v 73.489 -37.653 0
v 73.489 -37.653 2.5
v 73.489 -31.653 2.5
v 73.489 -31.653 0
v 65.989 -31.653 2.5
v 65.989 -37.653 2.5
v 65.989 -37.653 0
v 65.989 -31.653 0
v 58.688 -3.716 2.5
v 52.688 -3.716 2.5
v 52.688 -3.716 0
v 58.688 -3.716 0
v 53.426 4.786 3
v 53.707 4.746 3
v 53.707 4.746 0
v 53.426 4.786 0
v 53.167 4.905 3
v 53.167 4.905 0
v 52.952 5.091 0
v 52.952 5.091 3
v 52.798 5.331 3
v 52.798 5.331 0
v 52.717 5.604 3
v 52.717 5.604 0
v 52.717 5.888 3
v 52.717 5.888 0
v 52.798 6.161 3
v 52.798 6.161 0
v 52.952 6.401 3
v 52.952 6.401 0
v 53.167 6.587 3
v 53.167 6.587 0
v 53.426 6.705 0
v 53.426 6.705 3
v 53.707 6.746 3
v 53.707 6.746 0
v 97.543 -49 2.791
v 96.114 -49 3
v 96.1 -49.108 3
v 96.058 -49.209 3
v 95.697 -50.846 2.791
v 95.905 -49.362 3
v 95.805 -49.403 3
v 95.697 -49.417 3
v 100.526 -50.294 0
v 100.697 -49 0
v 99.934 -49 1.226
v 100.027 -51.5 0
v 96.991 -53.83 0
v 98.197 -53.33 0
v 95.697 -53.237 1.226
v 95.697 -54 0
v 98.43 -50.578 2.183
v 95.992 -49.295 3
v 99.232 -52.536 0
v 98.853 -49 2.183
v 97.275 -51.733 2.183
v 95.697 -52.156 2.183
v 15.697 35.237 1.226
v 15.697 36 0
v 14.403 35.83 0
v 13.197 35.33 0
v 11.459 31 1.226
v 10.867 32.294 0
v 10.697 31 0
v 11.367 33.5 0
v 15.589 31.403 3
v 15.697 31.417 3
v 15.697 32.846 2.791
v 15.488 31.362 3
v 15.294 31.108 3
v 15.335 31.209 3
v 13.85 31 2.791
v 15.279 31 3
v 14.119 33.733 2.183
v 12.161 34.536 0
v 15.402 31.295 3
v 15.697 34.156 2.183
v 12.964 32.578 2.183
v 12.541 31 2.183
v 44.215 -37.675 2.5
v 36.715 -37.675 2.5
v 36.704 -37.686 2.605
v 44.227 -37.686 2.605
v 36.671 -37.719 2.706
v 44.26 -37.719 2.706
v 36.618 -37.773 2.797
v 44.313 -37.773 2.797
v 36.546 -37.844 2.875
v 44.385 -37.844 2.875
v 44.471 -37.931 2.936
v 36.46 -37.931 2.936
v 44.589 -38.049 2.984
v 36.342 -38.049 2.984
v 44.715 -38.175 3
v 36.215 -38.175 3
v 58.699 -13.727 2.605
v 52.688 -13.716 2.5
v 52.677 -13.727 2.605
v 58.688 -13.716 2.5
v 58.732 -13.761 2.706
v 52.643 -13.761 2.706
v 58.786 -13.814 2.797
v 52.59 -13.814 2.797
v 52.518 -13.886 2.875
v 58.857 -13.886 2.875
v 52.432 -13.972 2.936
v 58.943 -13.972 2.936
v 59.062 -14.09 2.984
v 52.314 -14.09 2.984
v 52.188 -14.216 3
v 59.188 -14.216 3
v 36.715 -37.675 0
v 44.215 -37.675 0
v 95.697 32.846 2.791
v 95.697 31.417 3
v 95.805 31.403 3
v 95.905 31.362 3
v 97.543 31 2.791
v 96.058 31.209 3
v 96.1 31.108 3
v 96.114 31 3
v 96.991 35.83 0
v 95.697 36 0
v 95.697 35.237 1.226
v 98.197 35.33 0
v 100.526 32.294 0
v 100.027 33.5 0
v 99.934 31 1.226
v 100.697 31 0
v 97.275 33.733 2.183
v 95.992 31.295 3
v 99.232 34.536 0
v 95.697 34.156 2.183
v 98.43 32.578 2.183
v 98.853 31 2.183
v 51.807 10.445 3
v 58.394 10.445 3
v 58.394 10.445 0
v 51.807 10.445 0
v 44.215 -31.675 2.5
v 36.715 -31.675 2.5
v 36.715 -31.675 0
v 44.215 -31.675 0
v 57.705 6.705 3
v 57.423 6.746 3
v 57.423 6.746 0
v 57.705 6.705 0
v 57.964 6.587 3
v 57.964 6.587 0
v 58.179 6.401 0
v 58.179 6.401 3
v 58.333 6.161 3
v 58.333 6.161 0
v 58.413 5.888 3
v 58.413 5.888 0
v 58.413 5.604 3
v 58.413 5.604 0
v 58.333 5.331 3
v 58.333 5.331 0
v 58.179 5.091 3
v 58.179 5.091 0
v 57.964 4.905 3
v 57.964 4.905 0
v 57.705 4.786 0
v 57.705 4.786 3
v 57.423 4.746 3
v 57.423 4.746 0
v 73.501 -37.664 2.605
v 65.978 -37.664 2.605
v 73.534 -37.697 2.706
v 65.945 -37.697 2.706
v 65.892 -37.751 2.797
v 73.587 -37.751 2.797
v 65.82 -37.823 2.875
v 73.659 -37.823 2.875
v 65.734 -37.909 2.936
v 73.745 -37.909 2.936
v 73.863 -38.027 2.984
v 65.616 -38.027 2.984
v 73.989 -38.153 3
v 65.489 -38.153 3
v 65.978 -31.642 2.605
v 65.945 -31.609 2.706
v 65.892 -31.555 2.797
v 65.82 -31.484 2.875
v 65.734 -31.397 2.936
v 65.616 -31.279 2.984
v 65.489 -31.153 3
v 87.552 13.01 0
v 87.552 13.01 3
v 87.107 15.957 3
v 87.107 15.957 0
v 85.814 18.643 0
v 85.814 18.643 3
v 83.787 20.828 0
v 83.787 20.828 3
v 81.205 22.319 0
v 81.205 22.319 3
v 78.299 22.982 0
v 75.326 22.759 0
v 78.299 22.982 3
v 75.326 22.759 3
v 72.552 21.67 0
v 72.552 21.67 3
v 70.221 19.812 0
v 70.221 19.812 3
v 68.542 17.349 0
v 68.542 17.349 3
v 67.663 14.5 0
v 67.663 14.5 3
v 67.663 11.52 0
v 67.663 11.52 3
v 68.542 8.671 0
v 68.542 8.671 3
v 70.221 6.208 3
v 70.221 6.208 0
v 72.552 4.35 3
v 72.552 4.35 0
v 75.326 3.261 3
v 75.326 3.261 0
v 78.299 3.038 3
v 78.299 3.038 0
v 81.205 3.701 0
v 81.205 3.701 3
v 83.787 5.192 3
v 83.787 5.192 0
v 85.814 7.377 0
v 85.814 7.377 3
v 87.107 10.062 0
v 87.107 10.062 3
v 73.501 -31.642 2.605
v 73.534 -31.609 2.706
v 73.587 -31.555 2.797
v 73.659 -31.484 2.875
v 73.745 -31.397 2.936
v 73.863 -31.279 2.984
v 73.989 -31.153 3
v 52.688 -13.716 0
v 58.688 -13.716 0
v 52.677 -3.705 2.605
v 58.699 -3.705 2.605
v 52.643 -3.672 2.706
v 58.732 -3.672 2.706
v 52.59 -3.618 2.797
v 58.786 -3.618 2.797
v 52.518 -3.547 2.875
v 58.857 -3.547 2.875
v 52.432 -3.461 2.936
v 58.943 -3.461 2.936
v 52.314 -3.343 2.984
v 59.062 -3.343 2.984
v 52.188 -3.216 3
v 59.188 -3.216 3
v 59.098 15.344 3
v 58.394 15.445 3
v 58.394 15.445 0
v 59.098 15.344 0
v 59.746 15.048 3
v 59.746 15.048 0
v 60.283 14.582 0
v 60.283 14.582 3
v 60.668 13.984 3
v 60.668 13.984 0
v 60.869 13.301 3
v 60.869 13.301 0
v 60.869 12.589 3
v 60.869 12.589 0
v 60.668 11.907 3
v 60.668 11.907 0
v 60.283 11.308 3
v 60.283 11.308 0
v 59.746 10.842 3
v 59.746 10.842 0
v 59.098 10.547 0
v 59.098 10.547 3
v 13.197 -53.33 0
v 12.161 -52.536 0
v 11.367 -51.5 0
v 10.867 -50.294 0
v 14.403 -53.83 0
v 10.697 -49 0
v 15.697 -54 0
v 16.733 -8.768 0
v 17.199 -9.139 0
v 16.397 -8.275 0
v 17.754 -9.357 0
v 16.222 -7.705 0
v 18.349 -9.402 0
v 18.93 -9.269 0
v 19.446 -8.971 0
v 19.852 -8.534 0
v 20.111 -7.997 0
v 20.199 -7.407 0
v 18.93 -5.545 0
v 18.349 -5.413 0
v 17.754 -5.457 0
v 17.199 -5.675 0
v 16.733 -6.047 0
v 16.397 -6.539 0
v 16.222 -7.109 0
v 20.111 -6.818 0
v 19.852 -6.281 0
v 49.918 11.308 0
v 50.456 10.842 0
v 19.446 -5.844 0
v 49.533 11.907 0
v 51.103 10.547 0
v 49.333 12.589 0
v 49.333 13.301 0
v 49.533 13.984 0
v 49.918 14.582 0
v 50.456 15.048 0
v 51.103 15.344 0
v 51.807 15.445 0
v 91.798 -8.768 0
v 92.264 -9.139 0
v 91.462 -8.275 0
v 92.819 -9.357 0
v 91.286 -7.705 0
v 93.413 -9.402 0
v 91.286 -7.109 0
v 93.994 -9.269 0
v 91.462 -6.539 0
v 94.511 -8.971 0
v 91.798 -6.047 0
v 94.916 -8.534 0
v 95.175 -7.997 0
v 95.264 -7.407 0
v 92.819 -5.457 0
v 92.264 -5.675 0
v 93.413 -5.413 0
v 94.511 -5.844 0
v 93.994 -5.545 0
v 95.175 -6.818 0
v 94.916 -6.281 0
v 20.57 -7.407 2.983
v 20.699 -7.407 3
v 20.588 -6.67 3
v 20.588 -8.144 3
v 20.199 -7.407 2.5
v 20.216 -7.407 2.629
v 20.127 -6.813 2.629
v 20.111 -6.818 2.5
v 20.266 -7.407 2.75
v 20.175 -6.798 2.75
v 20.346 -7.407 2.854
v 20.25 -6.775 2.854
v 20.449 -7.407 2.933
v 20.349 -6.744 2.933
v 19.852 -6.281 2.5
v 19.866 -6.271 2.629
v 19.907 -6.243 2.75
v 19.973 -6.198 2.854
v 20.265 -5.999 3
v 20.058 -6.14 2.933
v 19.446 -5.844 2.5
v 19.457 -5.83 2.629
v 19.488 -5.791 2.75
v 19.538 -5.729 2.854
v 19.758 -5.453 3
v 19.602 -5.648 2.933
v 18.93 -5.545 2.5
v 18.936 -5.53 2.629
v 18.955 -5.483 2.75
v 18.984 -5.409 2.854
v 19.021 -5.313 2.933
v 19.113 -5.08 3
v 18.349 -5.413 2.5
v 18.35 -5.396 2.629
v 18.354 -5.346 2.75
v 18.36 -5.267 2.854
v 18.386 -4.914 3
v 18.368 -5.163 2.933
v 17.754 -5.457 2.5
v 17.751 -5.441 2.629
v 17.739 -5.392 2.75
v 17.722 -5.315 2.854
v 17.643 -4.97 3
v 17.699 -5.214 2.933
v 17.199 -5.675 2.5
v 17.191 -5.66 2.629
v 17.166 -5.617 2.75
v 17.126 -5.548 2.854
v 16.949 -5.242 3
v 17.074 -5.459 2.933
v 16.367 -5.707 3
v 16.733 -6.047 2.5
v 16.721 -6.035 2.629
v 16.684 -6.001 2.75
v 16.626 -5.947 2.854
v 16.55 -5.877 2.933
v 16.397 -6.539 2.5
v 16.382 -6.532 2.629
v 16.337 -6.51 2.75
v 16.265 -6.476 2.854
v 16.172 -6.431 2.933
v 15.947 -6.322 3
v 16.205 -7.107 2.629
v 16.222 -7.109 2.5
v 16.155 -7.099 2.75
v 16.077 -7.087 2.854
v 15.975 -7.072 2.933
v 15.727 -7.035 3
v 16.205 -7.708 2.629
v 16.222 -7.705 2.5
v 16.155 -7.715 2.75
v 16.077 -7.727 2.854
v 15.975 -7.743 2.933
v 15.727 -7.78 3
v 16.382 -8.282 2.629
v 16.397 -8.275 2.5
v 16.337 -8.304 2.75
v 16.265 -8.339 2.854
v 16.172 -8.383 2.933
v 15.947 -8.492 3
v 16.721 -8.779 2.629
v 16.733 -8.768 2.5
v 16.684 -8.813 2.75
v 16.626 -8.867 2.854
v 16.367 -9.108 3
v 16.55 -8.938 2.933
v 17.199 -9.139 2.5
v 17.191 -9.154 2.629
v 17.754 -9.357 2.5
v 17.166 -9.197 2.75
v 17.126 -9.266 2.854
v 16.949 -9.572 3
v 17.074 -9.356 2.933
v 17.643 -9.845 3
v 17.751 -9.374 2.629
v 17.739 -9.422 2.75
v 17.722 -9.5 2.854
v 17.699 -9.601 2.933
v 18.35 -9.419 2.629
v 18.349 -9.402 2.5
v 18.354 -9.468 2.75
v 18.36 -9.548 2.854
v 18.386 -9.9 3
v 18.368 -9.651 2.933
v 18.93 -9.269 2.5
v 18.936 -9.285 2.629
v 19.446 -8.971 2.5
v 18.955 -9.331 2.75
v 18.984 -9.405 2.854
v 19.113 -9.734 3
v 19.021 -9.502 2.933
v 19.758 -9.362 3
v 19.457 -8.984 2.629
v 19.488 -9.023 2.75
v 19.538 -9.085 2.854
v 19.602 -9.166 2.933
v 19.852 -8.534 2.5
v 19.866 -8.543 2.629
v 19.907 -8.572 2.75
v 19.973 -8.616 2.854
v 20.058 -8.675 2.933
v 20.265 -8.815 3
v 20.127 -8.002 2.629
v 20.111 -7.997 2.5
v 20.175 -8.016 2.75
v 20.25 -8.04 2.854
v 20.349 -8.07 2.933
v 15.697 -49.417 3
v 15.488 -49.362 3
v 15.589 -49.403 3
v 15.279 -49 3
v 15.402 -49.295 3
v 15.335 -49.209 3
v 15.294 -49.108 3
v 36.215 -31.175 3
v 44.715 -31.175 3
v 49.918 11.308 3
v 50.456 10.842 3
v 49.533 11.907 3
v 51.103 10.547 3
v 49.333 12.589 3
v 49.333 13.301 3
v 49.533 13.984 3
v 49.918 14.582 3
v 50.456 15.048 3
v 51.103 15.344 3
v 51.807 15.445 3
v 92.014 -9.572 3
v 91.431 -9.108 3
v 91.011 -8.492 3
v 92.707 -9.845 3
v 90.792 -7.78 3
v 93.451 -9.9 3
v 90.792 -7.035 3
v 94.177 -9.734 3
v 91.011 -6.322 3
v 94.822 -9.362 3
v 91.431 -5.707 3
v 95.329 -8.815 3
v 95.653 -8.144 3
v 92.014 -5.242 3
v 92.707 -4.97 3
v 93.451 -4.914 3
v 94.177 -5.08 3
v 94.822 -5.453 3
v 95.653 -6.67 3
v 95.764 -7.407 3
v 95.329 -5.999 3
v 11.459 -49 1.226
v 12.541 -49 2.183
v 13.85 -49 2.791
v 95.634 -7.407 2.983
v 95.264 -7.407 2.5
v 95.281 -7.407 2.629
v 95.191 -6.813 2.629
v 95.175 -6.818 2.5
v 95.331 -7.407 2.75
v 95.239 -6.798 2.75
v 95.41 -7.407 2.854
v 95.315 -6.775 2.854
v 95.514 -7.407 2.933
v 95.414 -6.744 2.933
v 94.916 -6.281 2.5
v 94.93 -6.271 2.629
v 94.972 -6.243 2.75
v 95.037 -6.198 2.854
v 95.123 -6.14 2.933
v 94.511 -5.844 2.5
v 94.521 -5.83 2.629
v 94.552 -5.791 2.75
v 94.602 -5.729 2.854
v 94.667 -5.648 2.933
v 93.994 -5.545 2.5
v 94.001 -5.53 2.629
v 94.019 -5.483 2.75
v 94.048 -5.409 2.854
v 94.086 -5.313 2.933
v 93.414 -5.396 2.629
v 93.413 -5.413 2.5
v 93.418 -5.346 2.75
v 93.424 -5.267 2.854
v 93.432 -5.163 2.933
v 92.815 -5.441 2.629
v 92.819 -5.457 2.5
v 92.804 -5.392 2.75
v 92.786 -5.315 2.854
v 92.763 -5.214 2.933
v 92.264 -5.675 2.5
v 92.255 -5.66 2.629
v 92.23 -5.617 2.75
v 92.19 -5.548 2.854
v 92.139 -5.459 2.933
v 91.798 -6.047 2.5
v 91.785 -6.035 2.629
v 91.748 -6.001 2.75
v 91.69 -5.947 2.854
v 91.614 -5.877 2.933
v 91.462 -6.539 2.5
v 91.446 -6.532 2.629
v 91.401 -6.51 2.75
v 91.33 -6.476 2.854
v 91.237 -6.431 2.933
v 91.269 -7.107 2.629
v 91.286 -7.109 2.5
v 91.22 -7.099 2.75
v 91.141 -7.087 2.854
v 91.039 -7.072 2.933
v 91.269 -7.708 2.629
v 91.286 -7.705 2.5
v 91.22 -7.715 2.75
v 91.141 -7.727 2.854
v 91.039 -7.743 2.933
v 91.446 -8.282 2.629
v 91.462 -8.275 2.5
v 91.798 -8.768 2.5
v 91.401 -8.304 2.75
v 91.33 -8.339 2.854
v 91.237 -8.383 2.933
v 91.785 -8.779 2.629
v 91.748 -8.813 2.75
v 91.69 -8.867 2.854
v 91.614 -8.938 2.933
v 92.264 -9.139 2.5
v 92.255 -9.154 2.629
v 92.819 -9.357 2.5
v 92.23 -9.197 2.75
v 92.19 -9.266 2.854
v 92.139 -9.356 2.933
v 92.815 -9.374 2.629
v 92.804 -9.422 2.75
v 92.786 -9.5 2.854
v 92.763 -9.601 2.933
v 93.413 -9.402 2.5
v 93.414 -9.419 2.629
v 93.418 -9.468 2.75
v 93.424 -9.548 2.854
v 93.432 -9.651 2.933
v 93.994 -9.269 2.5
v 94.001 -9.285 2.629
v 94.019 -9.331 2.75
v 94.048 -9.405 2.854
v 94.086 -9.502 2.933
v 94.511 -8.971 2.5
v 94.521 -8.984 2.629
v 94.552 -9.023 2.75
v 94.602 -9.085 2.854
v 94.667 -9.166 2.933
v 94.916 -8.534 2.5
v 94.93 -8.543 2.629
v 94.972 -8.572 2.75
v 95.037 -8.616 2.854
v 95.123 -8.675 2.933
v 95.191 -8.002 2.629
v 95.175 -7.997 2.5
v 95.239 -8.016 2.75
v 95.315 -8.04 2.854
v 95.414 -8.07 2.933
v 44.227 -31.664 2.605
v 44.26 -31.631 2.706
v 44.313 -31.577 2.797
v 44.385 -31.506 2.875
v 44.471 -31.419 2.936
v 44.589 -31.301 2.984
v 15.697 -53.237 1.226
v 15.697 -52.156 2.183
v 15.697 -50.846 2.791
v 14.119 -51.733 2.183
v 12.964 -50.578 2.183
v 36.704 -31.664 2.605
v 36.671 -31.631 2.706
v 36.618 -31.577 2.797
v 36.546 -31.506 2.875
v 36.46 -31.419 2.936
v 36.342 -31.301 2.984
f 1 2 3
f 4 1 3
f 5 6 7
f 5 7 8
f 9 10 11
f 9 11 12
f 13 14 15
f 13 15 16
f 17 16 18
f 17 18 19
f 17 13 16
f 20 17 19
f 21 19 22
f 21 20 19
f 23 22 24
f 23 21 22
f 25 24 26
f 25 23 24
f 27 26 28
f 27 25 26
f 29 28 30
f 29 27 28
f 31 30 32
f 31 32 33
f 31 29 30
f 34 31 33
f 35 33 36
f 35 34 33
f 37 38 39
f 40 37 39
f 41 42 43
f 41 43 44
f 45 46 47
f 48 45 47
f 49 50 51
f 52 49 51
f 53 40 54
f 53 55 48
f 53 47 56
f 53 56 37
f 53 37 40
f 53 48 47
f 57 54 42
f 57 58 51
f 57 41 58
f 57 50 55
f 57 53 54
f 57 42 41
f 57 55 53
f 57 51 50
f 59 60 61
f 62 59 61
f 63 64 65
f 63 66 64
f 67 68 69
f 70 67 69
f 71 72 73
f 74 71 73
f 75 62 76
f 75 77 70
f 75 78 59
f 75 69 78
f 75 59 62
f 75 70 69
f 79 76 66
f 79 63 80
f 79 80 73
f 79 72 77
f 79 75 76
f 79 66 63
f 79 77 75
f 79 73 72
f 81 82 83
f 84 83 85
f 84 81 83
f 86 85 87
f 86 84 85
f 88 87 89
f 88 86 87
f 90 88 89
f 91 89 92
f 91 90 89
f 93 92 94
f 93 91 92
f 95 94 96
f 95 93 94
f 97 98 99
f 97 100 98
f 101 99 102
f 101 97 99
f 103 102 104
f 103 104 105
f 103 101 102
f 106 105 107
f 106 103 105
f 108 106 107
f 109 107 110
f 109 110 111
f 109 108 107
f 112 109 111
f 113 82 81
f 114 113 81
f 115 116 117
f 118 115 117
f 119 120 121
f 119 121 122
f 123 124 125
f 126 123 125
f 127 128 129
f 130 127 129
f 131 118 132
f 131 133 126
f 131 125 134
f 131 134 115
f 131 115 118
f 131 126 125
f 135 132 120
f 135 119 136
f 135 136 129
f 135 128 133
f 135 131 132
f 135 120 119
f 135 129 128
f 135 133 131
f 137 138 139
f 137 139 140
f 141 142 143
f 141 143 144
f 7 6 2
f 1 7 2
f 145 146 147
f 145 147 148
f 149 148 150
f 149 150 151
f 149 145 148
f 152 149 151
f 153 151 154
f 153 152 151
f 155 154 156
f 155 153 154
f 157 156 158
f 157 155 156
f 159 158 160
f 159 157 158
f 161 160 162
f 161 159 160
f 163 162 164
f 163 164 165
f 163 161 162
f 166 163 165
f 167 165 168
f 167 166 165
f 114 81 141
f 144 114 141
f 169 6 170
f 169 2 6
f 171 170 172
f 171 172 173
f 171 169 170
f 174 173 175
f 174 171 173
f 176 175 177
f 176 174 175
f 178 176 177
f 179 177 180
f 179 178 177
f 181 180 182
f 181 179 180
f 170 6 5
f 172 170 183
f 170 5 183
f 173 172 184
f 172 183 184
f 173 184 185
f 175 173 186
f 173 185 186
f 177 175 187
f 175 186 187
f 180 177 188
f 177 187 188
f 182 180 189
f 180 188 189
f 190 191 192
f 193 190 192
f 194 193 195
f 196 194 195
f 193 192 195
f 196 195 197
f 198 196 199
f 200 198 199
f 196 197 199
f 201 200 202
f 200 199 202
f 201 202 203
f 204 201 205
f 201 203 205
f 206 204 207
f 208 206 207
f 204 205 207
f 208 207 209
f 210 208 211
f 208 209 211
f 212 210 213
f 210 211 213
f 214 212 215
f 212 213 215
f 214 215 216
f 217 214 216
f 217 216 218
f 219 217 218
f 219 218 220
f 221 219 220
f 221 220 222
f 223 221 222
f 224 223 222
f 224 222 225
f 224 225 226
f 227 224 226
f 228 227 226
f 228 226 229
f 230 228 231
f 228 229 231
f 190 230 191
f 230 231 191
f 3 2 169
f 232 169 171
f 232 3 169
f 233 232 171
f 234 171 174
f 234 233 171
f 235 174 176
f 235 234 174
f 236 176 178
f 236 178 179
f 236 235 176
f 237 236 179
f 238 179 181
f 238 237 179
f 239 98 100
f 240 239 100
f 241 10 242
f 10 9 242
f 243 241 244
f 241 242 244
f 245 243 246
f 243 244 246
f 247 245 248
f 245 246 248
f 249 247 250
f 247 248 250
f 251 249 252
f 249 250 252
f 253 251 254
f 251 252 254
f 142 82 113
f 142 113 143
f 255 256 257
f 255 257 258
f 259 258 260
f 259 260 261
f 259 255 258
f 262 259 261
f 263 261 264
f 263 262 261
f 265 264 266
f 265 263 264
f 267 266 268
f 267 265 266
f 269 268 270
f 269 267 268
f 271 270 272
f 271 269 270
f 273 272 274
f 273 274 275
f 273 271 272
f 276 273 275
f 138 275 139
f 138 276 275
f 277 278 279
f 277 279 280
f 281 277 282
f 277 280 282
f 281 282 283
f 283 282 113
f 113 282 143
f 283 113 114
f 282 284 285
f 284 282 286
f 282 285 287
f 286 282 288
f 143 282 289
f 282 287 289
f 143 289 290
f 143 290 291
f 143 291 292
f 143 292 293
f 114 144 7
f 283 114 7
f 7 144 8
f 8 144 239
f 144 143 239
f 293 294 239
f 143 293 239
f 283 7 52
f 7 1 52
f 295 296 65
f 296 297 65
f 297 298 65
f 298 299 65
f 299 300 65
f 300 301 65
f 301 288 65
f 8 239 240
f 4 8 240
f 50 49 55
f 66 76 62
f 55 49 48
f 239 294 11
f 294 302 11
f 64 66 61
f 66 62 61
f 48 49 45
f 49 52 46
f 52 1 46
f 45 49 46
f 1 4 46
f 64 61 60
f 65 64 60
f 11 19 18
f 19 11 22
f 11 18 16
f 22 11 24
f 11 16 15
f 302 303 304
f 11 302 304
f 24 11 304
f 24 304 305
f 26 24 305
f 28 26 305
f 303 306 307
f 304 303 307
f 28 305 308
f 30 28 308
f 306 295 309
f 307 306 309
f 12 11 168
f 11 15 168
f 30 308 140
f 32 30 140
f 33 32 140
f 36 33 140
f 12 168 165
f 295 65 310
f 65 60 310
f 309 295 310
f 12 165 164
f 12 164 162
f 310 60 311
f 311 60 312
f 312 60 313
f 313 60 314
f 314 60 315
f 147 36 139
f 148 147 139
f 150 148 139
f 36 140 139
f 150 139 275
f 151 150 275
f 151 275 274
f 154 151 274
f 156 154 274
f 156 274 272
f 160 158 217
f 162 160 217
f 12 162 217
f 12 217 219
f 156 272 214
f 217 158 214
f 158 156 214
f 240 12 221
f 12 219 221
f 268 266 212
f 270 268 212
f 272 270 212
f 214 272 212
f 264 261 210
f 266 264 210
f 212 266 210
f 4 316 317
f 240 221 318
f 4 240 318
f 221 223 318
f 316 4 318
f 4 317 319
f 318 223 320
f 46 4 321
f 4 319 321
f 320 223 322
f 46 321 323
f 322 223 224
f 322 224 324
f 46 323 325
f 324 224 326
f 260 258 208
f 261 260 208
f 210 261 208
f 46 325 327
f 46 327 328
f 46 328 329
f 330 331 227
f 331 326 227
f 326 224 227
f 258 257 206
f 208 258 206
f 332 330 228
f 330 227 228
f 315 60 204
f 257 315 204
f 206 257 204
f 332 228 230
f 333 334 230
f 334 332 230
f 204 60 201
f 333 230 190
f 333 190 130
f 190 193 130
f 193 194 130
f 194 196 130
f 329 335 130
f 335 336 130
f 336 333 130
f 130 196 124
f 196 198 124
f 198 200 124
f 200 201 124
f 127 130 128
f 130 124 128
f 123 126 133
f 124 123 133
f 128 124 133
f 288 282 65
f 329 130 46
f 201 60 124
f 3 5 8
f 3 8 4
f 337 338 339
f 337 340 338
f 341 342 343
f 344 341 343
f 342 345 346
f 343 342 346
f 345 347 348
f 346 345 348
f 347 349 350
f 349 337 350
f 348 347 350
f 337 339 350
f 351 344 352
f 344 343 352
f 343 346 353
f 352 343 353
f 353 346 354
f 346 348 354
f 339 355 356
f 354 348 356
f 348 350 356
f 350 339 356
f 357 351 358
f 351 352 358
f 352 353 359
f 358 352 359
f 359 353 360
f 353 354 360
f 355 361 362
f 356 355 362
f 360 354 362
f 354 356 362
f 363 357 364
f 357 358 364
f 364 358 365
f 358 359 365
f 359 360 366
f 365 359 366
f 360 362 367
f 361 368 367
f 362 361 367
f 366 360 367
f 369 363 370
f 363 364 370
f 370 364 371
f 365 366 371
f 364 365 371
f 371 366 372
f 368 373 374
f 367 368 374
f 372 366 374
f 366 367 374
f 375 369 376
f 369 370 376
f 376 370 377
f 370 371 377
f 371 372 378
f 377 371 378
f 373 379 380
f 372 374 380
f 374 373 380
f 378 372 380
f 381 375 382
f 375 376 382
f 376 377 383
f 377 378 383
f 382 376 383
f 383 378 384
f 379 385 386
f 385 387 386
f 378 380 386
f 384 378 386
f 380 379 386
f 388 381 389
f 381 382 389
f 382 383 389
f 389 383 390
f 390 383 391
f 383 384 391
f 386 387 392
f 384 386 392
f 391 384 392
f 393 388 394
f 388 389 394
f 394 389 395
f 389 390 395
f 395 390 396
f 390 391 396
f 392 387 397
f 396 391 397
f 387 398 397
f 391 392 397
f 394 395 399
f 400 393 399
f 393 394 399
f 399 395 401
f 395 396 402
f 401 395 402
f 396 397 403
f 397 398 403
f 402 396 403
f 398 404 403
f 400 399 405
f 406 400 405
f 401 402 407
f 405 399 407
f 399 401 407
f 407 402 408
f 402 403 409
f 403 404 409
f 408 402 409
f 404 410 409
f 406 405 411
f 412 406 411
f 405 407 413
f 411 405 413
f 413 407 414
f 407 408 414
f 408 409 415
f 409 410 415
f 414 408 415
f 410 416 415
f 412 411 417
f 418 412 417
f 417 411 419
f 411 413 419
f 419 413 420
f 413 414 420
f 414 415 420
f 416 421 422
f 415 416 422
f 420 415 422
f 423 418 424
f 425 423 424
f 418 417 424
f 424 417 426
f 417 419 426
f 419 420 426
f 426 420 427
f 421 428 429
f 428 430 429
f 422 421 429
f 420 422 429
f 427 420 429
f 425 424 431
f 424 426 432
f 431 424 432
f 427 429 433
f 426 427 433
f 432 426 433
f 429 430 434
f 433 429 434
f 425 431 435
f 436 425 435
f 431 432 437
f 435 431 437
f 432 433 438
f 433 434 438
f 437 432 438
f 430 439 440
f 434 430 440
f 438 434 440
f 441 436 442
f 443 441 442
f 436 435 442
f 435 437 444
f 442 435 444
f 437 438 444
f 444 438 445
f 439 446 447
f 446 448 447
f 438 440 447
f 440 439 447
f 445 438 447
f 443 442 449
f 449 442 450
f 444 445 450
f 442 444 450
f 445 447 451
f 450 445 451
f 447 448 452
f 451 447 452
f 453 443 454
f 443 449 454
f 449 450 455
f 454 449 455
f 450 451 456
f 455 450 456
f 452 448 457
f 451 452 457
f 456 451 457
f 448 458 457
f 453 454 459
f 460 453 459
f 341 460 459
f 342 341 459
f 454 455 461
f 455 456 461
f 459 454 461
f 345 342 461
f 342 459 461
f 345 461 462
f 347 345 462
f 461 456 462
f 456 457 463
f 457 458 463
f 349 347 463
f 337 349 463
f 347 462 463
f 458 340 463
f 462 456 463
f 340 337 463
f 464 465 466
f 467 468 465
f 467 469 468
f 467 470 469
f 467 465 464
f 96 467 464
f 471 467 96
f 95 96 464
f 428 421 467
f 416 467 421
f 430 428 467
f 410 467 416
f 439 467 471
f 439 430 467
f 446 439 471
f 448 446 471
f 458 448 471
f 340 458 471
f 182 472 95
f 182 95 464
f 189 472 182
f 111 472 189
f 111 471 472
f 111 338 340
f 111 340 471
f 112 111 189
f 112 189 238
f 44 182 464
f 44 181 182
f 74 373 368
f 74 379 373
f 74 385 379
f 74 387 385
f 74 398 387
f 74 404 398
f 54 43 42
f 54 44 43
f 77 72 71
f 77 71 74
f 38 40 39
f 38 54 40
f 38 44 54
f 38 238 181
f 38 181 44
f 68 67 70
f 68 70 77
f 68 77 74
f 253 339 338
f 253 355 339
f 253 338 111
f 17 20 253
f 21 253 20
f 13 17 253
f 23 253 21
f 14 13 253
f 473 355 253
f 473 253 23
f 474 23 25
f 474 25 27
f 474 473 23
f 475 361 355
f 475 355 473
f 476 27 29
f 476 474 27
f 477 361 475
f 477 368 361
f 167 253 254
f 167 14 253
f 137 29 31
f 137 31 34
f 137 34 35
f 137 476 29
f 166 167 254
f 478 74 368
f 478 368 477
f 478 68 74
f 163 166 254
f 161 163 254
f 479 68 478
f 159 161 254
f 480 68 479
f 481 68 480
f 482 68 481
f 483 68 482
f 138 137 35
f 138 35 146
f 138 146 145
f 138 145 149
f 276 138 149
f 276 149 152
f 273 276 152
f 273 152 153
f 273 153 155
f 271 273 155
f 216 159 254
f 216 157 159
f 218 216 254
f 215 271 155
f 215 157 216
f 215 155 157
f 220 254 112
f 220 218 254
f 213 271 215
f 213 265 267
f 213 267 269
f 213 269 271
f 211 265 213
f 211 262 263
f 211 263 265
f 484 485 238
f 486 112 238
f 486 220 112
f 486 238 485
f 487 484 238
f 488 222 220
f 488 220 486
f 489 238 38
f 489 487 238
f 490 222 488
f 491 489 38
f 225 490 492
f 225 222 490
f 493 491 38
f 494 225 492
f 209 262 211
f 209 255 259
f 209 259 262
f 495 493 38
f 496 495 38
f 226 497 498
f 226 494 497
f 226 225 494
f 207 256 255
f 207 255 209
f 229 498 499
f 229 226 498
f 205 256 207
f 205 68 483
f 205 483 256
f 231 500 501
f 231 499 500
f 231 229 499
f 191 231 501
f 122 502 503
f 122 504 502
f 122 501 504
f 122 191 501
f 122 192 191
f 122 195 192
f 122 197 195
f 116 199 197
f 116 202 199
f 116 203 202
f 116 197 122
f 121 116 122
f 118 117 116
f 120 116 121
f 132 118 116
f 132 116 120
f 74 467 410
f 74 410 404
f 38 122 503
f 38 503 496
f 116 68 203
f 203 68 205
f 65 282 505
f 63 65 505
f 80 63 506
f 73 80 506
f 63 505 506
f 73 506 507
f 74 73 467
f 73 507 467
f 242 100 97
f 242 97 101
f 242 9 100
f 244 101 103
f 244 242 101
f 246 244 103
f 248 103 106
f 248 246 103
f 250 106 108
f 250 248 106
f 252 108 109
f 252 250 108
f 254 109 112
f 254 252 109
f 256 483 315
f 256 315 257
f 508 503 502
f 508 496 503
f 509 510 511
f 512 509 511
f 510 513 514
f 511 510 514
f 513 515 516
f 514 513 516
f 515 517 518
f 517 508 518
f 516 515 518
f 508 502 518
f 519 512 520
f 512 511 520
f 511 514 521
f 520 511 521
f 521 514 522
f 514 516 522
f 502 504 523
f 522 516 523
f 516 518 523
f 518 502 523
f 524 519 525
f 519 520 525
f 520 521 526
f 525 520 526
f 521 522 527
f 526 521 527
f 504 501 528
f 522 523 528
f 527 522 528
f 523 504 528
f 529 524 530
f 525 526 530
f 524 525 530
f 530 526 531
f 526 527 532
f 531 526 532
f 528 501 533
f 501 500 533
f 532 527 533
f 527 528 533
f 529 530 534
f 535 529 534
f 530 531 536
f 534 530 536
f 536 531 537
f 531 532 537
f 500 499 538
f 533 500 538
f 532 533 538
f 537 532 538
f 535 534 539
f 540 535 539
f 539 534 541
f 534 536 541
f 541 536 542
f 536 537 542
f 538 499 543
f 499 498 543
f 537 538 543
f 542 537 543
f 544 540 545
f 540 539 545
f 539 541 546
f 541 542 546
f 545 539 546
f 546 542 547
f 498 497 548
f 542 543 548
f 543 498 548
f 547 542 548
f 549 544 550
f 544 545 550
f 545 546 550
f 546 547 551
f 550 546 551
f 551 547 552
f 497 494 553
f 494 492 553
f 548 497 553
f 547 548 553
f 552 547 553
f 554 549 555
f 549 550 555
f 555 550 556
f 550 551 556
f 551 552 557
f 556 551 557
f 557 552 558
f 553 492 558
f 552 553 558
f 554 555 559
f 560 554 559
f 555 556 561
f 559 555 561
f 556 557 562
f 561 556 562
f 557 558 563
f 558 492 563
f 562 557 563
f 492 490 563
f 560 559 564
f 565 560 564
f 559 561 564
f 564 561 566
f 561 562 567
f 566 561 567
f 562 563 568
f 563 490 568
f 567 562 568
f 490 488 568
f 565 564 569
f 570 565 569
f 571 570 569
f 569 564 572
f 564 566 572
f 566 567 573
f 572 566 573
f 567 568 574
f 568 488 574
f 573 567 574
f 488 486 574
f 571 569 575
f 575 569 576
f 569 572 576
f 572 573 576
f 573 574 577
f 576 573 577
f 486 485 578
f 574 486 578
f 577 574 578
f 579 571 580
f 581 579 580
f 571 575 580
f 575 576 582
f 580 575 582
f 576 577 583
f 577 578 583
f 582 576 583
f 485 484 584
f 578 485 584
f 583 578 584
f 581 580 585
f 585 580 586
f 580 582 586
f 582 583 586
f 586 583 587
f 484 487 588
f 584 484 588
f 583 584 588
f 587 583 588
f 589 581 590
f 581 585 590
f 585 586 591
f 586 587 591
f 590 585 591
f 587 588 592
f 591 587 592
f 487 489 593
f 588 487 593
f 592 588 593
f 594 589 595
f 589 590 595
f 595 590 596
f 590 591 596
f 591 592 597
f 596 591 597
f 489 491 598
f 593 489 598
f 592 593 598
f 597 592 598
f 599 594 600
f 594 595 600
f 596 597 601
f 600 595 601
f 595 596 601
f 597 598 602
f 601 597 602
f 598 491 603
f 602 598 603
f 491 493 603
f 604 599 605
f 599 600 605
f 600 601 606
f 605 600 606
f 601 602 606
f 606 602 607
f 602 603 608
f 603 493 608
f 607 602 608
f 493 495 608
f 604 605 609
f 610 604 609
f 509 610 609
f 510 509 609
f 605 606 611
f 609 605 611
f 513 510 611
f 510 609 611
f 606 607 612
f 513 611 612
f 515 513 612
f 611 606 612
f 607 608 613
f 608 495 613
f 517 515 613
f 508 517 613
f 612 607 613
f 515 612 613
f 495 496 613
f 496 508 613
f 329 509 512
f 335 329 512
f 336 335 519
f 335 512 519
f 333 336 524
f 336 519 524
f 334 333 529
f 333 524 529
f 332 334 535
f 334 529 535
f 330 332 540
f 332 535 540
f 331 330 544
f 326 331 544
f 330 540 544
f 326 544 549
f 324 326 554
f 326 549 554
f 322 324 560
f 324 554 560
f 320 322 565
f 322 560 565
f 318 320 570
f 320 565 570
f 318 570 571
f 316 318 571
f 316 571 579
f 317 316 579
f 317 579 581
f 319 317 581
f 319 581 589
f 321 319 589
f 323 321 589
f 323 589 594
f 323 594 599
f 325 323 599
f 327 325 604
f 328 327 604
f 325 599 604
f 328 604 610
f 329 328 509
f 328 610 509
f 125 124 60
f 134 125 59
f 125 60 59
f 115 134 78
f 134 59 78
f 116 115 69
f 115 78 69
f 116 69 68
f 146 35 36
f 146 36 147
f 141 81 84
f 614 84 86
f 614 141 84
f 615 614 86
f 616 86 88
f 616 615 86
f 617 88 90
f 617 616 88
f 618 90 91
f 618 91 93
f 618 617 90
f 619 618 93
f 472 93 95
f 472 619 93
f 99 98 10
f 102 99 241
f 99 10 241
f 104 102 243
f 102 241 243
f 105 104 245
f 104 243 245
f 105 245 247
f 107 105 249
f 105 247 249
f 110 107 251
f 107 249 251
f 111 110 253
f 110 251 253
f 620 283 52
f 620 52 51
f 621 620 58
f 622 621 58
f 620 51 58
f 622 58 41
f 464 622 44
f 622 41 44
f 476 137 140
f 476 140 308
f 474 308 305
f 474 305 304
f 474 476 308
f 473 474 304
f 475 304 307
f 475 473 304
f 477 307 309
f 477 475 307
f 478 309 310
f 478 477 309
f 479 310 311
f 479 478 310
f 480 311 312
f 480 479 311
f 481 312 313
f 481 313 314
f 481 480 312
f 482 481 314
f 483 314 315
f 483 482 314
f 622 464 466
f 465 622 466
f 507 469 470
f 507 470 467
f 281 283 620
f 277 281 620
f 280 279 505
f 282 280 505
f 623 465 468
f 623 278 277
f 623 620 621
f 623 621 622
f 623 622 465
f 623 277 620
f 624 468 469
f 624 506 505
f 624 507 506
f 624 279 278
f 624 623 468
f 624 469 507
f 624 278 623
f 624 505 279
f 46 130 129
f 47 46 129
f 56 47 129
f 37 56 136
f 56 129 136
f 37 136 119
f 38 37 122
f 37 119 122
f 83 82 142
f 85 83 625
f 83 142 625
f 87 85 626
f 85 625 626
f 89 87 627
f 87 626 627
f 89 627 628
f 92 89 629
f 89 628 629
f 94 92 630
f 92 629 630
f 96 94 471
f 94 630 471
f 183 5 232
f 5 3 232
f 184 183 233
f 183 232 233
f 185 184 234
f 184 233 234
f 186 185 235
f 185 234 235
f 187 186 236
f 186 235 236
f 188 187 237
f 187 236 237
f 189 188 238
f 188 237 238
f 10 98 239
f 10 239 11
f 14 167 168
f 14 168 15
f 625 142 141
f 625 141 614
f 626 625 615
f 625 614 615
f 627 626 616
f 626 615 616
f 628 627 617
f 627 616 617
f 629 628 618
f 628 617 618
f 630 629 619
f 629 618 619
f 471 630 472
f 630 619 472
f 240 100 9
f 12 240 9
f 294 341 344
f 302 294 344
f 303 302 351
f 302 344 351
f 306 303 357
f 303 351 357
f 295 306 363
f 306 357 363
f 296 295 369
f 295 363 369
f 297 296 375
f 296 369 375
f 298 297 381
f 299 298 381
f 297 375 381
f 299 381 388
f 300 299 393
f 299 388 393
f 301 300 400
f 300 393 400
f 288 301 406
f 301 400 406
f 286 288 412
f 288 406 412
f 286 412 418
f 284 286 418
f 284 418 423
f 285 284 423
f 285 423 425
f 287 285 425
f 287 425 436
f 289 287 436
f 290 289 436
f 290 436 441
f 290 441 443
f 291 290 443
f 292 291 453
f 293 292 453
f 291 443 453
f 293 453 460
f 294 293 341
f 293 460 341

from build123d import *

# Parameters (mm, degrees)
SKETCH1_W           = 90
SKETCH1_H           = 90
BOSS_EXTRUDE5_DEPTH = 3
FILLET14_R          = 5
FILLET15_R          = 5
SKETCH17_R          = 10
SKETCH17_R_2        = 2
SKETCH17_W          = 7.5
SKETCH17_H          = 6
SKETCH17_W_2        = 6
SKETCH17_H_2        = 10
CUT_EXTRUDE4_DEPTH  = 3
FILLET16_R          = 0.5


with BuildPart() as part:
    # Sketch1 → Boss-Extrude5 (new body)
    with BuildSketch(Plane.XY):
        with Locations((55.696781823, -9)):
            Rectangle(SKETCH1_W, SKETCH1_H)
    extrude(amount=BOSS_EXTRUDE5_DEPTH)

    # Fillet14
    fillet14_edges = [part.edges().sort_by_distance(p)[0] for p in [
        (10.696781823, 36, 1.5),
        (100.696781823, 36, 1.5),
        (100.696781823, -54, 1.5),
        (10.696781823, -54, 1.5),
    ]]
    fillet(fillet14_edges, radius=FILLET14_R)

    # Fillet15
    # the kernel refuses this fillet: 5 mm, written as the material it takes off along each edge
    with BuildSketch(Plane(origin=(15.696781823, 31, 3), x_dir=(0, 1, 0), z_dir=(1, 0, 0))) as fillet15_piece_1:
        with BuildLine():
            CenterArc((0.417424305, -5), FILLET15_R, 23.578178478, 66.421821522)
            Line((0.417424305, 0), (0.417424305, 0.1))
            Line((0.417424305, 0.1), (5, 0.1))
            Line((5, 0.1), (5.1, 0))
            ThreePointArc((5.1, 0), (5.1, -1.5), (5.091651514, -2.96))
            Line((5.091651514, -2.96), (5, -3))
        make_face()
    revolve(axis=Axis((15.696781823, 31, 3), (0, 0, 1)), revolution_arc=90, mode=Mode.SUBTRACT)
    with BuildSketch(Plane(origin=(15.696781823, 36, 3), x_dir=(0, 0, -1), z_dir=(1, 0, 0))) as fillet15_piece_2:
        with BuildLine():
            CenterArc((5, -4.582575695), FILLET15_R, 113.578178478, 66.421821522)
            Line((0, -4.582575695), (-0.1, -4.582575695))
            Line((-0.1, -4.582575695), (-0.1, 0))
            Line((-0.1, 0), (0, 0.1))
            ThreePointArc((0, 0.1), (1.5, 0.1), (2.96, 0.091651514))
            Line((2.96, 0.091651514), (3, 0))
        make_face()
    extrude(amount=80, mode=Mode.SUBTRACT)
    with BuildSketch(Plane(origin=(95.696781823, 31, 3), x_dir=(0, 1, 0), z_dir=(-1, 0, 0))) as fillet15_piece_3:
        with BuildLine():
            CenterArc((0.417424305, 5), FILLET15_R, 270, 66.421821522)
            Line((0.417424305, 0), (0.417424305, -0.1))
            Line((0.417424305, -0.1), (5, -0.1))
            Line((5, -0.1), (5.1, 0))
            ThreePointArc((5.1, 0), (5.1, 1.5), (5.091651514, 2.96))
            Line((5.091651514, 2.96), (5, 3))
        make_face()
    revolve(axis=Axis((95.696781823, 31, 3), (0, 0, -1)), revolution_arc=90, mode=Mode.SUBTRACT)
    with BuildSketch(Plane(origin=(100.696781823, 31, 3), x_dir=(-1, 0, 0), z_dir=(0, -1, 0)), Plane(origin=(95.696781823, -54, 3), x_dir=(0, 1, 0), z_dir=(-1, 0, 0)), Plane(origin=(10.696781823, -49, 3), x_dir=(1, 0, 0), z_dir=(0, 1, 0))) as fillet15_piece_4:
        with BuildLine():
            CenterArc((4.582575695, 5), FILLET15_R, 203.578178478, 66.421821522)
            Line((0, 3), (-0.091651514, 2.96))
            ThreePointArc((-0.091651514, 2.96), (-0.1, 1.5), (-0.1, 0))
            Line((-0.1, 0), (0, -0.1))
            Line((0, -0.1), (4.582575695, -0.1))
            Line((4.582575695, -0.1), (4.582575695, 0))
        make_face()
    extrude(amount=80, mode=Mode.SUBTRACT)
    with BuildSketch(Plane(origin=(95.696781823, -49, 3), x_dir=(1, 0, 0), z_dir=(0, 1, 0))) as fillet15_piece_5:
        with BuildLine():
            CenterArc((0.417424305, 5), FILLET15_R, 270, 66.421821522)
            Line((5, 3), (5.091651514, 2.96))
            ThreePointArc((5.091651514, 2.96), (5.1, 1.5), (5.1, 0))
            Line((5.1, 0), (5, -0.1))
            Line((5, -0.1), (0.417424305, -0.1))
            Line((0.417424305, -0.1), (0.417424305, 0))
        make_face()
    revolve(axis=Axis((95.696781823, -49, 3), (0, 0, -1)), revolution_arc=90, mode=Mode.SUBTRACT)
    with BuildSketch(Plane(origin=(15.696781823, -49, 3), x_dir=(0, -1, 0), z_dir=(1, 0, 0))) as fillet15_piece_6:
        with BuildLine():
            CenterArc((0.417424305, 5), FILLET15_R, 270, 66.421821522)
            Line((5, 3), (5.091651514, 2.96))
            ThreePointArc((5.091651514, 2.96), (5.1, 1.5), (5.1, 0))
            Line((5.1, 0), (5, -0.1))
            Line((5, -0.1), (0.417424305, -0.1))
            Line((0.417424305, -0.1), (0.417424305, 0))
        make_face()
    revolve(axis=Axis((15.696781823, -49, 3), (0, 0, -1)), revolution_arc=90, mode=Mode.SUBTRACT)

    # Sketch17 → Cut-Extrude4 (cut)
    with BuildSketch(Plane.XY.offset(3)):
        with Locations((77.551683104, 13.009941811)):
            Circle(SKETCH17_R)
        with Locations((18.19937678, -7.407199345)):
            Circle(SKETCH17_R_2)
        with Locations((93.263694242, -7.407199345)):
            Circle(SKETCH17_R_2)
        with Locations((69.739484947, -34.653171103)):
            Rectangle(SKETCH17_W, SKETCH17_H)
        with Locations((55.687795517, -8.716286613)):
            Rectangle(SKETCH17_W_2, SKETCH17_H_2)
        with Locations((40.465326937, -34.674989483)):
            Rectangle(SKETCH17_W, SKETCH17_H)
        with BuildLine():
            Line((53.707261797, 6.745948723), (57.423415647, 6.745948723))
            ThreePointArc((57.423415647, 6.745948723), (58.423415647, 5.745948723), (57.423415647, 4.745948723))
            Line((57.423415647, 4.745948723), (53.707261797, 4.745948723))
            ThreePointArc((53.707261797, 4.745948723), (52.707261797, 5.745948723), (53.707261797, 6.745948723))
        make_face()
        with BuildLine():
            Line((51.807146289, 15.44525347), (58.394003545, 15.44525347))
            ThreePointArc((58.394003545, 15.44525347), (60.894003545, 12.94525347), (58.394003545, 10.44525347))
            Line((58.394003545, 10.44525347), (51.807146289, 10.44525347))
            ThreePointArc((51.807146289, 10.44525347), (49.307146289, 12.94525347), (51.807146289, 15.44525347))
        make_face()
    extrude(amount=-CUT_EXTRUDE4_DEPTH, mode=Mode.SUBTRACT)

    # Fillet16
    fillet16_edges = [part.edges().sort_by_distance(p)[0] for p in [
        (16.19937678, -7.407199345, 3),
        (91.263694242, -7.407199345, 3),
        (52.687795517, -8.716286613, 3),
        (55.687795517, -13.716286613, 3),
        (58.687795517, -8.716286613, 3),
        (55.687795517, -3.716286613, 3),
        (36.715326937, -34.674989483, 3),
        (40.465326937, -37.674989483, 3),
        (44.215326937, -34.674989483, 3),
        (40.465326937, -31.674989483, 3),
        (65.989484947, -34.653171103, 3),
        (69.739484947, -37.653171103, 3),
        (73.489484947, -34.653171103, 3),
        (69.739484947, -31.653171103, 3),
    ]]
    fillet(fillet16_edges, radius=FILLET16_R)


solid = part.part
